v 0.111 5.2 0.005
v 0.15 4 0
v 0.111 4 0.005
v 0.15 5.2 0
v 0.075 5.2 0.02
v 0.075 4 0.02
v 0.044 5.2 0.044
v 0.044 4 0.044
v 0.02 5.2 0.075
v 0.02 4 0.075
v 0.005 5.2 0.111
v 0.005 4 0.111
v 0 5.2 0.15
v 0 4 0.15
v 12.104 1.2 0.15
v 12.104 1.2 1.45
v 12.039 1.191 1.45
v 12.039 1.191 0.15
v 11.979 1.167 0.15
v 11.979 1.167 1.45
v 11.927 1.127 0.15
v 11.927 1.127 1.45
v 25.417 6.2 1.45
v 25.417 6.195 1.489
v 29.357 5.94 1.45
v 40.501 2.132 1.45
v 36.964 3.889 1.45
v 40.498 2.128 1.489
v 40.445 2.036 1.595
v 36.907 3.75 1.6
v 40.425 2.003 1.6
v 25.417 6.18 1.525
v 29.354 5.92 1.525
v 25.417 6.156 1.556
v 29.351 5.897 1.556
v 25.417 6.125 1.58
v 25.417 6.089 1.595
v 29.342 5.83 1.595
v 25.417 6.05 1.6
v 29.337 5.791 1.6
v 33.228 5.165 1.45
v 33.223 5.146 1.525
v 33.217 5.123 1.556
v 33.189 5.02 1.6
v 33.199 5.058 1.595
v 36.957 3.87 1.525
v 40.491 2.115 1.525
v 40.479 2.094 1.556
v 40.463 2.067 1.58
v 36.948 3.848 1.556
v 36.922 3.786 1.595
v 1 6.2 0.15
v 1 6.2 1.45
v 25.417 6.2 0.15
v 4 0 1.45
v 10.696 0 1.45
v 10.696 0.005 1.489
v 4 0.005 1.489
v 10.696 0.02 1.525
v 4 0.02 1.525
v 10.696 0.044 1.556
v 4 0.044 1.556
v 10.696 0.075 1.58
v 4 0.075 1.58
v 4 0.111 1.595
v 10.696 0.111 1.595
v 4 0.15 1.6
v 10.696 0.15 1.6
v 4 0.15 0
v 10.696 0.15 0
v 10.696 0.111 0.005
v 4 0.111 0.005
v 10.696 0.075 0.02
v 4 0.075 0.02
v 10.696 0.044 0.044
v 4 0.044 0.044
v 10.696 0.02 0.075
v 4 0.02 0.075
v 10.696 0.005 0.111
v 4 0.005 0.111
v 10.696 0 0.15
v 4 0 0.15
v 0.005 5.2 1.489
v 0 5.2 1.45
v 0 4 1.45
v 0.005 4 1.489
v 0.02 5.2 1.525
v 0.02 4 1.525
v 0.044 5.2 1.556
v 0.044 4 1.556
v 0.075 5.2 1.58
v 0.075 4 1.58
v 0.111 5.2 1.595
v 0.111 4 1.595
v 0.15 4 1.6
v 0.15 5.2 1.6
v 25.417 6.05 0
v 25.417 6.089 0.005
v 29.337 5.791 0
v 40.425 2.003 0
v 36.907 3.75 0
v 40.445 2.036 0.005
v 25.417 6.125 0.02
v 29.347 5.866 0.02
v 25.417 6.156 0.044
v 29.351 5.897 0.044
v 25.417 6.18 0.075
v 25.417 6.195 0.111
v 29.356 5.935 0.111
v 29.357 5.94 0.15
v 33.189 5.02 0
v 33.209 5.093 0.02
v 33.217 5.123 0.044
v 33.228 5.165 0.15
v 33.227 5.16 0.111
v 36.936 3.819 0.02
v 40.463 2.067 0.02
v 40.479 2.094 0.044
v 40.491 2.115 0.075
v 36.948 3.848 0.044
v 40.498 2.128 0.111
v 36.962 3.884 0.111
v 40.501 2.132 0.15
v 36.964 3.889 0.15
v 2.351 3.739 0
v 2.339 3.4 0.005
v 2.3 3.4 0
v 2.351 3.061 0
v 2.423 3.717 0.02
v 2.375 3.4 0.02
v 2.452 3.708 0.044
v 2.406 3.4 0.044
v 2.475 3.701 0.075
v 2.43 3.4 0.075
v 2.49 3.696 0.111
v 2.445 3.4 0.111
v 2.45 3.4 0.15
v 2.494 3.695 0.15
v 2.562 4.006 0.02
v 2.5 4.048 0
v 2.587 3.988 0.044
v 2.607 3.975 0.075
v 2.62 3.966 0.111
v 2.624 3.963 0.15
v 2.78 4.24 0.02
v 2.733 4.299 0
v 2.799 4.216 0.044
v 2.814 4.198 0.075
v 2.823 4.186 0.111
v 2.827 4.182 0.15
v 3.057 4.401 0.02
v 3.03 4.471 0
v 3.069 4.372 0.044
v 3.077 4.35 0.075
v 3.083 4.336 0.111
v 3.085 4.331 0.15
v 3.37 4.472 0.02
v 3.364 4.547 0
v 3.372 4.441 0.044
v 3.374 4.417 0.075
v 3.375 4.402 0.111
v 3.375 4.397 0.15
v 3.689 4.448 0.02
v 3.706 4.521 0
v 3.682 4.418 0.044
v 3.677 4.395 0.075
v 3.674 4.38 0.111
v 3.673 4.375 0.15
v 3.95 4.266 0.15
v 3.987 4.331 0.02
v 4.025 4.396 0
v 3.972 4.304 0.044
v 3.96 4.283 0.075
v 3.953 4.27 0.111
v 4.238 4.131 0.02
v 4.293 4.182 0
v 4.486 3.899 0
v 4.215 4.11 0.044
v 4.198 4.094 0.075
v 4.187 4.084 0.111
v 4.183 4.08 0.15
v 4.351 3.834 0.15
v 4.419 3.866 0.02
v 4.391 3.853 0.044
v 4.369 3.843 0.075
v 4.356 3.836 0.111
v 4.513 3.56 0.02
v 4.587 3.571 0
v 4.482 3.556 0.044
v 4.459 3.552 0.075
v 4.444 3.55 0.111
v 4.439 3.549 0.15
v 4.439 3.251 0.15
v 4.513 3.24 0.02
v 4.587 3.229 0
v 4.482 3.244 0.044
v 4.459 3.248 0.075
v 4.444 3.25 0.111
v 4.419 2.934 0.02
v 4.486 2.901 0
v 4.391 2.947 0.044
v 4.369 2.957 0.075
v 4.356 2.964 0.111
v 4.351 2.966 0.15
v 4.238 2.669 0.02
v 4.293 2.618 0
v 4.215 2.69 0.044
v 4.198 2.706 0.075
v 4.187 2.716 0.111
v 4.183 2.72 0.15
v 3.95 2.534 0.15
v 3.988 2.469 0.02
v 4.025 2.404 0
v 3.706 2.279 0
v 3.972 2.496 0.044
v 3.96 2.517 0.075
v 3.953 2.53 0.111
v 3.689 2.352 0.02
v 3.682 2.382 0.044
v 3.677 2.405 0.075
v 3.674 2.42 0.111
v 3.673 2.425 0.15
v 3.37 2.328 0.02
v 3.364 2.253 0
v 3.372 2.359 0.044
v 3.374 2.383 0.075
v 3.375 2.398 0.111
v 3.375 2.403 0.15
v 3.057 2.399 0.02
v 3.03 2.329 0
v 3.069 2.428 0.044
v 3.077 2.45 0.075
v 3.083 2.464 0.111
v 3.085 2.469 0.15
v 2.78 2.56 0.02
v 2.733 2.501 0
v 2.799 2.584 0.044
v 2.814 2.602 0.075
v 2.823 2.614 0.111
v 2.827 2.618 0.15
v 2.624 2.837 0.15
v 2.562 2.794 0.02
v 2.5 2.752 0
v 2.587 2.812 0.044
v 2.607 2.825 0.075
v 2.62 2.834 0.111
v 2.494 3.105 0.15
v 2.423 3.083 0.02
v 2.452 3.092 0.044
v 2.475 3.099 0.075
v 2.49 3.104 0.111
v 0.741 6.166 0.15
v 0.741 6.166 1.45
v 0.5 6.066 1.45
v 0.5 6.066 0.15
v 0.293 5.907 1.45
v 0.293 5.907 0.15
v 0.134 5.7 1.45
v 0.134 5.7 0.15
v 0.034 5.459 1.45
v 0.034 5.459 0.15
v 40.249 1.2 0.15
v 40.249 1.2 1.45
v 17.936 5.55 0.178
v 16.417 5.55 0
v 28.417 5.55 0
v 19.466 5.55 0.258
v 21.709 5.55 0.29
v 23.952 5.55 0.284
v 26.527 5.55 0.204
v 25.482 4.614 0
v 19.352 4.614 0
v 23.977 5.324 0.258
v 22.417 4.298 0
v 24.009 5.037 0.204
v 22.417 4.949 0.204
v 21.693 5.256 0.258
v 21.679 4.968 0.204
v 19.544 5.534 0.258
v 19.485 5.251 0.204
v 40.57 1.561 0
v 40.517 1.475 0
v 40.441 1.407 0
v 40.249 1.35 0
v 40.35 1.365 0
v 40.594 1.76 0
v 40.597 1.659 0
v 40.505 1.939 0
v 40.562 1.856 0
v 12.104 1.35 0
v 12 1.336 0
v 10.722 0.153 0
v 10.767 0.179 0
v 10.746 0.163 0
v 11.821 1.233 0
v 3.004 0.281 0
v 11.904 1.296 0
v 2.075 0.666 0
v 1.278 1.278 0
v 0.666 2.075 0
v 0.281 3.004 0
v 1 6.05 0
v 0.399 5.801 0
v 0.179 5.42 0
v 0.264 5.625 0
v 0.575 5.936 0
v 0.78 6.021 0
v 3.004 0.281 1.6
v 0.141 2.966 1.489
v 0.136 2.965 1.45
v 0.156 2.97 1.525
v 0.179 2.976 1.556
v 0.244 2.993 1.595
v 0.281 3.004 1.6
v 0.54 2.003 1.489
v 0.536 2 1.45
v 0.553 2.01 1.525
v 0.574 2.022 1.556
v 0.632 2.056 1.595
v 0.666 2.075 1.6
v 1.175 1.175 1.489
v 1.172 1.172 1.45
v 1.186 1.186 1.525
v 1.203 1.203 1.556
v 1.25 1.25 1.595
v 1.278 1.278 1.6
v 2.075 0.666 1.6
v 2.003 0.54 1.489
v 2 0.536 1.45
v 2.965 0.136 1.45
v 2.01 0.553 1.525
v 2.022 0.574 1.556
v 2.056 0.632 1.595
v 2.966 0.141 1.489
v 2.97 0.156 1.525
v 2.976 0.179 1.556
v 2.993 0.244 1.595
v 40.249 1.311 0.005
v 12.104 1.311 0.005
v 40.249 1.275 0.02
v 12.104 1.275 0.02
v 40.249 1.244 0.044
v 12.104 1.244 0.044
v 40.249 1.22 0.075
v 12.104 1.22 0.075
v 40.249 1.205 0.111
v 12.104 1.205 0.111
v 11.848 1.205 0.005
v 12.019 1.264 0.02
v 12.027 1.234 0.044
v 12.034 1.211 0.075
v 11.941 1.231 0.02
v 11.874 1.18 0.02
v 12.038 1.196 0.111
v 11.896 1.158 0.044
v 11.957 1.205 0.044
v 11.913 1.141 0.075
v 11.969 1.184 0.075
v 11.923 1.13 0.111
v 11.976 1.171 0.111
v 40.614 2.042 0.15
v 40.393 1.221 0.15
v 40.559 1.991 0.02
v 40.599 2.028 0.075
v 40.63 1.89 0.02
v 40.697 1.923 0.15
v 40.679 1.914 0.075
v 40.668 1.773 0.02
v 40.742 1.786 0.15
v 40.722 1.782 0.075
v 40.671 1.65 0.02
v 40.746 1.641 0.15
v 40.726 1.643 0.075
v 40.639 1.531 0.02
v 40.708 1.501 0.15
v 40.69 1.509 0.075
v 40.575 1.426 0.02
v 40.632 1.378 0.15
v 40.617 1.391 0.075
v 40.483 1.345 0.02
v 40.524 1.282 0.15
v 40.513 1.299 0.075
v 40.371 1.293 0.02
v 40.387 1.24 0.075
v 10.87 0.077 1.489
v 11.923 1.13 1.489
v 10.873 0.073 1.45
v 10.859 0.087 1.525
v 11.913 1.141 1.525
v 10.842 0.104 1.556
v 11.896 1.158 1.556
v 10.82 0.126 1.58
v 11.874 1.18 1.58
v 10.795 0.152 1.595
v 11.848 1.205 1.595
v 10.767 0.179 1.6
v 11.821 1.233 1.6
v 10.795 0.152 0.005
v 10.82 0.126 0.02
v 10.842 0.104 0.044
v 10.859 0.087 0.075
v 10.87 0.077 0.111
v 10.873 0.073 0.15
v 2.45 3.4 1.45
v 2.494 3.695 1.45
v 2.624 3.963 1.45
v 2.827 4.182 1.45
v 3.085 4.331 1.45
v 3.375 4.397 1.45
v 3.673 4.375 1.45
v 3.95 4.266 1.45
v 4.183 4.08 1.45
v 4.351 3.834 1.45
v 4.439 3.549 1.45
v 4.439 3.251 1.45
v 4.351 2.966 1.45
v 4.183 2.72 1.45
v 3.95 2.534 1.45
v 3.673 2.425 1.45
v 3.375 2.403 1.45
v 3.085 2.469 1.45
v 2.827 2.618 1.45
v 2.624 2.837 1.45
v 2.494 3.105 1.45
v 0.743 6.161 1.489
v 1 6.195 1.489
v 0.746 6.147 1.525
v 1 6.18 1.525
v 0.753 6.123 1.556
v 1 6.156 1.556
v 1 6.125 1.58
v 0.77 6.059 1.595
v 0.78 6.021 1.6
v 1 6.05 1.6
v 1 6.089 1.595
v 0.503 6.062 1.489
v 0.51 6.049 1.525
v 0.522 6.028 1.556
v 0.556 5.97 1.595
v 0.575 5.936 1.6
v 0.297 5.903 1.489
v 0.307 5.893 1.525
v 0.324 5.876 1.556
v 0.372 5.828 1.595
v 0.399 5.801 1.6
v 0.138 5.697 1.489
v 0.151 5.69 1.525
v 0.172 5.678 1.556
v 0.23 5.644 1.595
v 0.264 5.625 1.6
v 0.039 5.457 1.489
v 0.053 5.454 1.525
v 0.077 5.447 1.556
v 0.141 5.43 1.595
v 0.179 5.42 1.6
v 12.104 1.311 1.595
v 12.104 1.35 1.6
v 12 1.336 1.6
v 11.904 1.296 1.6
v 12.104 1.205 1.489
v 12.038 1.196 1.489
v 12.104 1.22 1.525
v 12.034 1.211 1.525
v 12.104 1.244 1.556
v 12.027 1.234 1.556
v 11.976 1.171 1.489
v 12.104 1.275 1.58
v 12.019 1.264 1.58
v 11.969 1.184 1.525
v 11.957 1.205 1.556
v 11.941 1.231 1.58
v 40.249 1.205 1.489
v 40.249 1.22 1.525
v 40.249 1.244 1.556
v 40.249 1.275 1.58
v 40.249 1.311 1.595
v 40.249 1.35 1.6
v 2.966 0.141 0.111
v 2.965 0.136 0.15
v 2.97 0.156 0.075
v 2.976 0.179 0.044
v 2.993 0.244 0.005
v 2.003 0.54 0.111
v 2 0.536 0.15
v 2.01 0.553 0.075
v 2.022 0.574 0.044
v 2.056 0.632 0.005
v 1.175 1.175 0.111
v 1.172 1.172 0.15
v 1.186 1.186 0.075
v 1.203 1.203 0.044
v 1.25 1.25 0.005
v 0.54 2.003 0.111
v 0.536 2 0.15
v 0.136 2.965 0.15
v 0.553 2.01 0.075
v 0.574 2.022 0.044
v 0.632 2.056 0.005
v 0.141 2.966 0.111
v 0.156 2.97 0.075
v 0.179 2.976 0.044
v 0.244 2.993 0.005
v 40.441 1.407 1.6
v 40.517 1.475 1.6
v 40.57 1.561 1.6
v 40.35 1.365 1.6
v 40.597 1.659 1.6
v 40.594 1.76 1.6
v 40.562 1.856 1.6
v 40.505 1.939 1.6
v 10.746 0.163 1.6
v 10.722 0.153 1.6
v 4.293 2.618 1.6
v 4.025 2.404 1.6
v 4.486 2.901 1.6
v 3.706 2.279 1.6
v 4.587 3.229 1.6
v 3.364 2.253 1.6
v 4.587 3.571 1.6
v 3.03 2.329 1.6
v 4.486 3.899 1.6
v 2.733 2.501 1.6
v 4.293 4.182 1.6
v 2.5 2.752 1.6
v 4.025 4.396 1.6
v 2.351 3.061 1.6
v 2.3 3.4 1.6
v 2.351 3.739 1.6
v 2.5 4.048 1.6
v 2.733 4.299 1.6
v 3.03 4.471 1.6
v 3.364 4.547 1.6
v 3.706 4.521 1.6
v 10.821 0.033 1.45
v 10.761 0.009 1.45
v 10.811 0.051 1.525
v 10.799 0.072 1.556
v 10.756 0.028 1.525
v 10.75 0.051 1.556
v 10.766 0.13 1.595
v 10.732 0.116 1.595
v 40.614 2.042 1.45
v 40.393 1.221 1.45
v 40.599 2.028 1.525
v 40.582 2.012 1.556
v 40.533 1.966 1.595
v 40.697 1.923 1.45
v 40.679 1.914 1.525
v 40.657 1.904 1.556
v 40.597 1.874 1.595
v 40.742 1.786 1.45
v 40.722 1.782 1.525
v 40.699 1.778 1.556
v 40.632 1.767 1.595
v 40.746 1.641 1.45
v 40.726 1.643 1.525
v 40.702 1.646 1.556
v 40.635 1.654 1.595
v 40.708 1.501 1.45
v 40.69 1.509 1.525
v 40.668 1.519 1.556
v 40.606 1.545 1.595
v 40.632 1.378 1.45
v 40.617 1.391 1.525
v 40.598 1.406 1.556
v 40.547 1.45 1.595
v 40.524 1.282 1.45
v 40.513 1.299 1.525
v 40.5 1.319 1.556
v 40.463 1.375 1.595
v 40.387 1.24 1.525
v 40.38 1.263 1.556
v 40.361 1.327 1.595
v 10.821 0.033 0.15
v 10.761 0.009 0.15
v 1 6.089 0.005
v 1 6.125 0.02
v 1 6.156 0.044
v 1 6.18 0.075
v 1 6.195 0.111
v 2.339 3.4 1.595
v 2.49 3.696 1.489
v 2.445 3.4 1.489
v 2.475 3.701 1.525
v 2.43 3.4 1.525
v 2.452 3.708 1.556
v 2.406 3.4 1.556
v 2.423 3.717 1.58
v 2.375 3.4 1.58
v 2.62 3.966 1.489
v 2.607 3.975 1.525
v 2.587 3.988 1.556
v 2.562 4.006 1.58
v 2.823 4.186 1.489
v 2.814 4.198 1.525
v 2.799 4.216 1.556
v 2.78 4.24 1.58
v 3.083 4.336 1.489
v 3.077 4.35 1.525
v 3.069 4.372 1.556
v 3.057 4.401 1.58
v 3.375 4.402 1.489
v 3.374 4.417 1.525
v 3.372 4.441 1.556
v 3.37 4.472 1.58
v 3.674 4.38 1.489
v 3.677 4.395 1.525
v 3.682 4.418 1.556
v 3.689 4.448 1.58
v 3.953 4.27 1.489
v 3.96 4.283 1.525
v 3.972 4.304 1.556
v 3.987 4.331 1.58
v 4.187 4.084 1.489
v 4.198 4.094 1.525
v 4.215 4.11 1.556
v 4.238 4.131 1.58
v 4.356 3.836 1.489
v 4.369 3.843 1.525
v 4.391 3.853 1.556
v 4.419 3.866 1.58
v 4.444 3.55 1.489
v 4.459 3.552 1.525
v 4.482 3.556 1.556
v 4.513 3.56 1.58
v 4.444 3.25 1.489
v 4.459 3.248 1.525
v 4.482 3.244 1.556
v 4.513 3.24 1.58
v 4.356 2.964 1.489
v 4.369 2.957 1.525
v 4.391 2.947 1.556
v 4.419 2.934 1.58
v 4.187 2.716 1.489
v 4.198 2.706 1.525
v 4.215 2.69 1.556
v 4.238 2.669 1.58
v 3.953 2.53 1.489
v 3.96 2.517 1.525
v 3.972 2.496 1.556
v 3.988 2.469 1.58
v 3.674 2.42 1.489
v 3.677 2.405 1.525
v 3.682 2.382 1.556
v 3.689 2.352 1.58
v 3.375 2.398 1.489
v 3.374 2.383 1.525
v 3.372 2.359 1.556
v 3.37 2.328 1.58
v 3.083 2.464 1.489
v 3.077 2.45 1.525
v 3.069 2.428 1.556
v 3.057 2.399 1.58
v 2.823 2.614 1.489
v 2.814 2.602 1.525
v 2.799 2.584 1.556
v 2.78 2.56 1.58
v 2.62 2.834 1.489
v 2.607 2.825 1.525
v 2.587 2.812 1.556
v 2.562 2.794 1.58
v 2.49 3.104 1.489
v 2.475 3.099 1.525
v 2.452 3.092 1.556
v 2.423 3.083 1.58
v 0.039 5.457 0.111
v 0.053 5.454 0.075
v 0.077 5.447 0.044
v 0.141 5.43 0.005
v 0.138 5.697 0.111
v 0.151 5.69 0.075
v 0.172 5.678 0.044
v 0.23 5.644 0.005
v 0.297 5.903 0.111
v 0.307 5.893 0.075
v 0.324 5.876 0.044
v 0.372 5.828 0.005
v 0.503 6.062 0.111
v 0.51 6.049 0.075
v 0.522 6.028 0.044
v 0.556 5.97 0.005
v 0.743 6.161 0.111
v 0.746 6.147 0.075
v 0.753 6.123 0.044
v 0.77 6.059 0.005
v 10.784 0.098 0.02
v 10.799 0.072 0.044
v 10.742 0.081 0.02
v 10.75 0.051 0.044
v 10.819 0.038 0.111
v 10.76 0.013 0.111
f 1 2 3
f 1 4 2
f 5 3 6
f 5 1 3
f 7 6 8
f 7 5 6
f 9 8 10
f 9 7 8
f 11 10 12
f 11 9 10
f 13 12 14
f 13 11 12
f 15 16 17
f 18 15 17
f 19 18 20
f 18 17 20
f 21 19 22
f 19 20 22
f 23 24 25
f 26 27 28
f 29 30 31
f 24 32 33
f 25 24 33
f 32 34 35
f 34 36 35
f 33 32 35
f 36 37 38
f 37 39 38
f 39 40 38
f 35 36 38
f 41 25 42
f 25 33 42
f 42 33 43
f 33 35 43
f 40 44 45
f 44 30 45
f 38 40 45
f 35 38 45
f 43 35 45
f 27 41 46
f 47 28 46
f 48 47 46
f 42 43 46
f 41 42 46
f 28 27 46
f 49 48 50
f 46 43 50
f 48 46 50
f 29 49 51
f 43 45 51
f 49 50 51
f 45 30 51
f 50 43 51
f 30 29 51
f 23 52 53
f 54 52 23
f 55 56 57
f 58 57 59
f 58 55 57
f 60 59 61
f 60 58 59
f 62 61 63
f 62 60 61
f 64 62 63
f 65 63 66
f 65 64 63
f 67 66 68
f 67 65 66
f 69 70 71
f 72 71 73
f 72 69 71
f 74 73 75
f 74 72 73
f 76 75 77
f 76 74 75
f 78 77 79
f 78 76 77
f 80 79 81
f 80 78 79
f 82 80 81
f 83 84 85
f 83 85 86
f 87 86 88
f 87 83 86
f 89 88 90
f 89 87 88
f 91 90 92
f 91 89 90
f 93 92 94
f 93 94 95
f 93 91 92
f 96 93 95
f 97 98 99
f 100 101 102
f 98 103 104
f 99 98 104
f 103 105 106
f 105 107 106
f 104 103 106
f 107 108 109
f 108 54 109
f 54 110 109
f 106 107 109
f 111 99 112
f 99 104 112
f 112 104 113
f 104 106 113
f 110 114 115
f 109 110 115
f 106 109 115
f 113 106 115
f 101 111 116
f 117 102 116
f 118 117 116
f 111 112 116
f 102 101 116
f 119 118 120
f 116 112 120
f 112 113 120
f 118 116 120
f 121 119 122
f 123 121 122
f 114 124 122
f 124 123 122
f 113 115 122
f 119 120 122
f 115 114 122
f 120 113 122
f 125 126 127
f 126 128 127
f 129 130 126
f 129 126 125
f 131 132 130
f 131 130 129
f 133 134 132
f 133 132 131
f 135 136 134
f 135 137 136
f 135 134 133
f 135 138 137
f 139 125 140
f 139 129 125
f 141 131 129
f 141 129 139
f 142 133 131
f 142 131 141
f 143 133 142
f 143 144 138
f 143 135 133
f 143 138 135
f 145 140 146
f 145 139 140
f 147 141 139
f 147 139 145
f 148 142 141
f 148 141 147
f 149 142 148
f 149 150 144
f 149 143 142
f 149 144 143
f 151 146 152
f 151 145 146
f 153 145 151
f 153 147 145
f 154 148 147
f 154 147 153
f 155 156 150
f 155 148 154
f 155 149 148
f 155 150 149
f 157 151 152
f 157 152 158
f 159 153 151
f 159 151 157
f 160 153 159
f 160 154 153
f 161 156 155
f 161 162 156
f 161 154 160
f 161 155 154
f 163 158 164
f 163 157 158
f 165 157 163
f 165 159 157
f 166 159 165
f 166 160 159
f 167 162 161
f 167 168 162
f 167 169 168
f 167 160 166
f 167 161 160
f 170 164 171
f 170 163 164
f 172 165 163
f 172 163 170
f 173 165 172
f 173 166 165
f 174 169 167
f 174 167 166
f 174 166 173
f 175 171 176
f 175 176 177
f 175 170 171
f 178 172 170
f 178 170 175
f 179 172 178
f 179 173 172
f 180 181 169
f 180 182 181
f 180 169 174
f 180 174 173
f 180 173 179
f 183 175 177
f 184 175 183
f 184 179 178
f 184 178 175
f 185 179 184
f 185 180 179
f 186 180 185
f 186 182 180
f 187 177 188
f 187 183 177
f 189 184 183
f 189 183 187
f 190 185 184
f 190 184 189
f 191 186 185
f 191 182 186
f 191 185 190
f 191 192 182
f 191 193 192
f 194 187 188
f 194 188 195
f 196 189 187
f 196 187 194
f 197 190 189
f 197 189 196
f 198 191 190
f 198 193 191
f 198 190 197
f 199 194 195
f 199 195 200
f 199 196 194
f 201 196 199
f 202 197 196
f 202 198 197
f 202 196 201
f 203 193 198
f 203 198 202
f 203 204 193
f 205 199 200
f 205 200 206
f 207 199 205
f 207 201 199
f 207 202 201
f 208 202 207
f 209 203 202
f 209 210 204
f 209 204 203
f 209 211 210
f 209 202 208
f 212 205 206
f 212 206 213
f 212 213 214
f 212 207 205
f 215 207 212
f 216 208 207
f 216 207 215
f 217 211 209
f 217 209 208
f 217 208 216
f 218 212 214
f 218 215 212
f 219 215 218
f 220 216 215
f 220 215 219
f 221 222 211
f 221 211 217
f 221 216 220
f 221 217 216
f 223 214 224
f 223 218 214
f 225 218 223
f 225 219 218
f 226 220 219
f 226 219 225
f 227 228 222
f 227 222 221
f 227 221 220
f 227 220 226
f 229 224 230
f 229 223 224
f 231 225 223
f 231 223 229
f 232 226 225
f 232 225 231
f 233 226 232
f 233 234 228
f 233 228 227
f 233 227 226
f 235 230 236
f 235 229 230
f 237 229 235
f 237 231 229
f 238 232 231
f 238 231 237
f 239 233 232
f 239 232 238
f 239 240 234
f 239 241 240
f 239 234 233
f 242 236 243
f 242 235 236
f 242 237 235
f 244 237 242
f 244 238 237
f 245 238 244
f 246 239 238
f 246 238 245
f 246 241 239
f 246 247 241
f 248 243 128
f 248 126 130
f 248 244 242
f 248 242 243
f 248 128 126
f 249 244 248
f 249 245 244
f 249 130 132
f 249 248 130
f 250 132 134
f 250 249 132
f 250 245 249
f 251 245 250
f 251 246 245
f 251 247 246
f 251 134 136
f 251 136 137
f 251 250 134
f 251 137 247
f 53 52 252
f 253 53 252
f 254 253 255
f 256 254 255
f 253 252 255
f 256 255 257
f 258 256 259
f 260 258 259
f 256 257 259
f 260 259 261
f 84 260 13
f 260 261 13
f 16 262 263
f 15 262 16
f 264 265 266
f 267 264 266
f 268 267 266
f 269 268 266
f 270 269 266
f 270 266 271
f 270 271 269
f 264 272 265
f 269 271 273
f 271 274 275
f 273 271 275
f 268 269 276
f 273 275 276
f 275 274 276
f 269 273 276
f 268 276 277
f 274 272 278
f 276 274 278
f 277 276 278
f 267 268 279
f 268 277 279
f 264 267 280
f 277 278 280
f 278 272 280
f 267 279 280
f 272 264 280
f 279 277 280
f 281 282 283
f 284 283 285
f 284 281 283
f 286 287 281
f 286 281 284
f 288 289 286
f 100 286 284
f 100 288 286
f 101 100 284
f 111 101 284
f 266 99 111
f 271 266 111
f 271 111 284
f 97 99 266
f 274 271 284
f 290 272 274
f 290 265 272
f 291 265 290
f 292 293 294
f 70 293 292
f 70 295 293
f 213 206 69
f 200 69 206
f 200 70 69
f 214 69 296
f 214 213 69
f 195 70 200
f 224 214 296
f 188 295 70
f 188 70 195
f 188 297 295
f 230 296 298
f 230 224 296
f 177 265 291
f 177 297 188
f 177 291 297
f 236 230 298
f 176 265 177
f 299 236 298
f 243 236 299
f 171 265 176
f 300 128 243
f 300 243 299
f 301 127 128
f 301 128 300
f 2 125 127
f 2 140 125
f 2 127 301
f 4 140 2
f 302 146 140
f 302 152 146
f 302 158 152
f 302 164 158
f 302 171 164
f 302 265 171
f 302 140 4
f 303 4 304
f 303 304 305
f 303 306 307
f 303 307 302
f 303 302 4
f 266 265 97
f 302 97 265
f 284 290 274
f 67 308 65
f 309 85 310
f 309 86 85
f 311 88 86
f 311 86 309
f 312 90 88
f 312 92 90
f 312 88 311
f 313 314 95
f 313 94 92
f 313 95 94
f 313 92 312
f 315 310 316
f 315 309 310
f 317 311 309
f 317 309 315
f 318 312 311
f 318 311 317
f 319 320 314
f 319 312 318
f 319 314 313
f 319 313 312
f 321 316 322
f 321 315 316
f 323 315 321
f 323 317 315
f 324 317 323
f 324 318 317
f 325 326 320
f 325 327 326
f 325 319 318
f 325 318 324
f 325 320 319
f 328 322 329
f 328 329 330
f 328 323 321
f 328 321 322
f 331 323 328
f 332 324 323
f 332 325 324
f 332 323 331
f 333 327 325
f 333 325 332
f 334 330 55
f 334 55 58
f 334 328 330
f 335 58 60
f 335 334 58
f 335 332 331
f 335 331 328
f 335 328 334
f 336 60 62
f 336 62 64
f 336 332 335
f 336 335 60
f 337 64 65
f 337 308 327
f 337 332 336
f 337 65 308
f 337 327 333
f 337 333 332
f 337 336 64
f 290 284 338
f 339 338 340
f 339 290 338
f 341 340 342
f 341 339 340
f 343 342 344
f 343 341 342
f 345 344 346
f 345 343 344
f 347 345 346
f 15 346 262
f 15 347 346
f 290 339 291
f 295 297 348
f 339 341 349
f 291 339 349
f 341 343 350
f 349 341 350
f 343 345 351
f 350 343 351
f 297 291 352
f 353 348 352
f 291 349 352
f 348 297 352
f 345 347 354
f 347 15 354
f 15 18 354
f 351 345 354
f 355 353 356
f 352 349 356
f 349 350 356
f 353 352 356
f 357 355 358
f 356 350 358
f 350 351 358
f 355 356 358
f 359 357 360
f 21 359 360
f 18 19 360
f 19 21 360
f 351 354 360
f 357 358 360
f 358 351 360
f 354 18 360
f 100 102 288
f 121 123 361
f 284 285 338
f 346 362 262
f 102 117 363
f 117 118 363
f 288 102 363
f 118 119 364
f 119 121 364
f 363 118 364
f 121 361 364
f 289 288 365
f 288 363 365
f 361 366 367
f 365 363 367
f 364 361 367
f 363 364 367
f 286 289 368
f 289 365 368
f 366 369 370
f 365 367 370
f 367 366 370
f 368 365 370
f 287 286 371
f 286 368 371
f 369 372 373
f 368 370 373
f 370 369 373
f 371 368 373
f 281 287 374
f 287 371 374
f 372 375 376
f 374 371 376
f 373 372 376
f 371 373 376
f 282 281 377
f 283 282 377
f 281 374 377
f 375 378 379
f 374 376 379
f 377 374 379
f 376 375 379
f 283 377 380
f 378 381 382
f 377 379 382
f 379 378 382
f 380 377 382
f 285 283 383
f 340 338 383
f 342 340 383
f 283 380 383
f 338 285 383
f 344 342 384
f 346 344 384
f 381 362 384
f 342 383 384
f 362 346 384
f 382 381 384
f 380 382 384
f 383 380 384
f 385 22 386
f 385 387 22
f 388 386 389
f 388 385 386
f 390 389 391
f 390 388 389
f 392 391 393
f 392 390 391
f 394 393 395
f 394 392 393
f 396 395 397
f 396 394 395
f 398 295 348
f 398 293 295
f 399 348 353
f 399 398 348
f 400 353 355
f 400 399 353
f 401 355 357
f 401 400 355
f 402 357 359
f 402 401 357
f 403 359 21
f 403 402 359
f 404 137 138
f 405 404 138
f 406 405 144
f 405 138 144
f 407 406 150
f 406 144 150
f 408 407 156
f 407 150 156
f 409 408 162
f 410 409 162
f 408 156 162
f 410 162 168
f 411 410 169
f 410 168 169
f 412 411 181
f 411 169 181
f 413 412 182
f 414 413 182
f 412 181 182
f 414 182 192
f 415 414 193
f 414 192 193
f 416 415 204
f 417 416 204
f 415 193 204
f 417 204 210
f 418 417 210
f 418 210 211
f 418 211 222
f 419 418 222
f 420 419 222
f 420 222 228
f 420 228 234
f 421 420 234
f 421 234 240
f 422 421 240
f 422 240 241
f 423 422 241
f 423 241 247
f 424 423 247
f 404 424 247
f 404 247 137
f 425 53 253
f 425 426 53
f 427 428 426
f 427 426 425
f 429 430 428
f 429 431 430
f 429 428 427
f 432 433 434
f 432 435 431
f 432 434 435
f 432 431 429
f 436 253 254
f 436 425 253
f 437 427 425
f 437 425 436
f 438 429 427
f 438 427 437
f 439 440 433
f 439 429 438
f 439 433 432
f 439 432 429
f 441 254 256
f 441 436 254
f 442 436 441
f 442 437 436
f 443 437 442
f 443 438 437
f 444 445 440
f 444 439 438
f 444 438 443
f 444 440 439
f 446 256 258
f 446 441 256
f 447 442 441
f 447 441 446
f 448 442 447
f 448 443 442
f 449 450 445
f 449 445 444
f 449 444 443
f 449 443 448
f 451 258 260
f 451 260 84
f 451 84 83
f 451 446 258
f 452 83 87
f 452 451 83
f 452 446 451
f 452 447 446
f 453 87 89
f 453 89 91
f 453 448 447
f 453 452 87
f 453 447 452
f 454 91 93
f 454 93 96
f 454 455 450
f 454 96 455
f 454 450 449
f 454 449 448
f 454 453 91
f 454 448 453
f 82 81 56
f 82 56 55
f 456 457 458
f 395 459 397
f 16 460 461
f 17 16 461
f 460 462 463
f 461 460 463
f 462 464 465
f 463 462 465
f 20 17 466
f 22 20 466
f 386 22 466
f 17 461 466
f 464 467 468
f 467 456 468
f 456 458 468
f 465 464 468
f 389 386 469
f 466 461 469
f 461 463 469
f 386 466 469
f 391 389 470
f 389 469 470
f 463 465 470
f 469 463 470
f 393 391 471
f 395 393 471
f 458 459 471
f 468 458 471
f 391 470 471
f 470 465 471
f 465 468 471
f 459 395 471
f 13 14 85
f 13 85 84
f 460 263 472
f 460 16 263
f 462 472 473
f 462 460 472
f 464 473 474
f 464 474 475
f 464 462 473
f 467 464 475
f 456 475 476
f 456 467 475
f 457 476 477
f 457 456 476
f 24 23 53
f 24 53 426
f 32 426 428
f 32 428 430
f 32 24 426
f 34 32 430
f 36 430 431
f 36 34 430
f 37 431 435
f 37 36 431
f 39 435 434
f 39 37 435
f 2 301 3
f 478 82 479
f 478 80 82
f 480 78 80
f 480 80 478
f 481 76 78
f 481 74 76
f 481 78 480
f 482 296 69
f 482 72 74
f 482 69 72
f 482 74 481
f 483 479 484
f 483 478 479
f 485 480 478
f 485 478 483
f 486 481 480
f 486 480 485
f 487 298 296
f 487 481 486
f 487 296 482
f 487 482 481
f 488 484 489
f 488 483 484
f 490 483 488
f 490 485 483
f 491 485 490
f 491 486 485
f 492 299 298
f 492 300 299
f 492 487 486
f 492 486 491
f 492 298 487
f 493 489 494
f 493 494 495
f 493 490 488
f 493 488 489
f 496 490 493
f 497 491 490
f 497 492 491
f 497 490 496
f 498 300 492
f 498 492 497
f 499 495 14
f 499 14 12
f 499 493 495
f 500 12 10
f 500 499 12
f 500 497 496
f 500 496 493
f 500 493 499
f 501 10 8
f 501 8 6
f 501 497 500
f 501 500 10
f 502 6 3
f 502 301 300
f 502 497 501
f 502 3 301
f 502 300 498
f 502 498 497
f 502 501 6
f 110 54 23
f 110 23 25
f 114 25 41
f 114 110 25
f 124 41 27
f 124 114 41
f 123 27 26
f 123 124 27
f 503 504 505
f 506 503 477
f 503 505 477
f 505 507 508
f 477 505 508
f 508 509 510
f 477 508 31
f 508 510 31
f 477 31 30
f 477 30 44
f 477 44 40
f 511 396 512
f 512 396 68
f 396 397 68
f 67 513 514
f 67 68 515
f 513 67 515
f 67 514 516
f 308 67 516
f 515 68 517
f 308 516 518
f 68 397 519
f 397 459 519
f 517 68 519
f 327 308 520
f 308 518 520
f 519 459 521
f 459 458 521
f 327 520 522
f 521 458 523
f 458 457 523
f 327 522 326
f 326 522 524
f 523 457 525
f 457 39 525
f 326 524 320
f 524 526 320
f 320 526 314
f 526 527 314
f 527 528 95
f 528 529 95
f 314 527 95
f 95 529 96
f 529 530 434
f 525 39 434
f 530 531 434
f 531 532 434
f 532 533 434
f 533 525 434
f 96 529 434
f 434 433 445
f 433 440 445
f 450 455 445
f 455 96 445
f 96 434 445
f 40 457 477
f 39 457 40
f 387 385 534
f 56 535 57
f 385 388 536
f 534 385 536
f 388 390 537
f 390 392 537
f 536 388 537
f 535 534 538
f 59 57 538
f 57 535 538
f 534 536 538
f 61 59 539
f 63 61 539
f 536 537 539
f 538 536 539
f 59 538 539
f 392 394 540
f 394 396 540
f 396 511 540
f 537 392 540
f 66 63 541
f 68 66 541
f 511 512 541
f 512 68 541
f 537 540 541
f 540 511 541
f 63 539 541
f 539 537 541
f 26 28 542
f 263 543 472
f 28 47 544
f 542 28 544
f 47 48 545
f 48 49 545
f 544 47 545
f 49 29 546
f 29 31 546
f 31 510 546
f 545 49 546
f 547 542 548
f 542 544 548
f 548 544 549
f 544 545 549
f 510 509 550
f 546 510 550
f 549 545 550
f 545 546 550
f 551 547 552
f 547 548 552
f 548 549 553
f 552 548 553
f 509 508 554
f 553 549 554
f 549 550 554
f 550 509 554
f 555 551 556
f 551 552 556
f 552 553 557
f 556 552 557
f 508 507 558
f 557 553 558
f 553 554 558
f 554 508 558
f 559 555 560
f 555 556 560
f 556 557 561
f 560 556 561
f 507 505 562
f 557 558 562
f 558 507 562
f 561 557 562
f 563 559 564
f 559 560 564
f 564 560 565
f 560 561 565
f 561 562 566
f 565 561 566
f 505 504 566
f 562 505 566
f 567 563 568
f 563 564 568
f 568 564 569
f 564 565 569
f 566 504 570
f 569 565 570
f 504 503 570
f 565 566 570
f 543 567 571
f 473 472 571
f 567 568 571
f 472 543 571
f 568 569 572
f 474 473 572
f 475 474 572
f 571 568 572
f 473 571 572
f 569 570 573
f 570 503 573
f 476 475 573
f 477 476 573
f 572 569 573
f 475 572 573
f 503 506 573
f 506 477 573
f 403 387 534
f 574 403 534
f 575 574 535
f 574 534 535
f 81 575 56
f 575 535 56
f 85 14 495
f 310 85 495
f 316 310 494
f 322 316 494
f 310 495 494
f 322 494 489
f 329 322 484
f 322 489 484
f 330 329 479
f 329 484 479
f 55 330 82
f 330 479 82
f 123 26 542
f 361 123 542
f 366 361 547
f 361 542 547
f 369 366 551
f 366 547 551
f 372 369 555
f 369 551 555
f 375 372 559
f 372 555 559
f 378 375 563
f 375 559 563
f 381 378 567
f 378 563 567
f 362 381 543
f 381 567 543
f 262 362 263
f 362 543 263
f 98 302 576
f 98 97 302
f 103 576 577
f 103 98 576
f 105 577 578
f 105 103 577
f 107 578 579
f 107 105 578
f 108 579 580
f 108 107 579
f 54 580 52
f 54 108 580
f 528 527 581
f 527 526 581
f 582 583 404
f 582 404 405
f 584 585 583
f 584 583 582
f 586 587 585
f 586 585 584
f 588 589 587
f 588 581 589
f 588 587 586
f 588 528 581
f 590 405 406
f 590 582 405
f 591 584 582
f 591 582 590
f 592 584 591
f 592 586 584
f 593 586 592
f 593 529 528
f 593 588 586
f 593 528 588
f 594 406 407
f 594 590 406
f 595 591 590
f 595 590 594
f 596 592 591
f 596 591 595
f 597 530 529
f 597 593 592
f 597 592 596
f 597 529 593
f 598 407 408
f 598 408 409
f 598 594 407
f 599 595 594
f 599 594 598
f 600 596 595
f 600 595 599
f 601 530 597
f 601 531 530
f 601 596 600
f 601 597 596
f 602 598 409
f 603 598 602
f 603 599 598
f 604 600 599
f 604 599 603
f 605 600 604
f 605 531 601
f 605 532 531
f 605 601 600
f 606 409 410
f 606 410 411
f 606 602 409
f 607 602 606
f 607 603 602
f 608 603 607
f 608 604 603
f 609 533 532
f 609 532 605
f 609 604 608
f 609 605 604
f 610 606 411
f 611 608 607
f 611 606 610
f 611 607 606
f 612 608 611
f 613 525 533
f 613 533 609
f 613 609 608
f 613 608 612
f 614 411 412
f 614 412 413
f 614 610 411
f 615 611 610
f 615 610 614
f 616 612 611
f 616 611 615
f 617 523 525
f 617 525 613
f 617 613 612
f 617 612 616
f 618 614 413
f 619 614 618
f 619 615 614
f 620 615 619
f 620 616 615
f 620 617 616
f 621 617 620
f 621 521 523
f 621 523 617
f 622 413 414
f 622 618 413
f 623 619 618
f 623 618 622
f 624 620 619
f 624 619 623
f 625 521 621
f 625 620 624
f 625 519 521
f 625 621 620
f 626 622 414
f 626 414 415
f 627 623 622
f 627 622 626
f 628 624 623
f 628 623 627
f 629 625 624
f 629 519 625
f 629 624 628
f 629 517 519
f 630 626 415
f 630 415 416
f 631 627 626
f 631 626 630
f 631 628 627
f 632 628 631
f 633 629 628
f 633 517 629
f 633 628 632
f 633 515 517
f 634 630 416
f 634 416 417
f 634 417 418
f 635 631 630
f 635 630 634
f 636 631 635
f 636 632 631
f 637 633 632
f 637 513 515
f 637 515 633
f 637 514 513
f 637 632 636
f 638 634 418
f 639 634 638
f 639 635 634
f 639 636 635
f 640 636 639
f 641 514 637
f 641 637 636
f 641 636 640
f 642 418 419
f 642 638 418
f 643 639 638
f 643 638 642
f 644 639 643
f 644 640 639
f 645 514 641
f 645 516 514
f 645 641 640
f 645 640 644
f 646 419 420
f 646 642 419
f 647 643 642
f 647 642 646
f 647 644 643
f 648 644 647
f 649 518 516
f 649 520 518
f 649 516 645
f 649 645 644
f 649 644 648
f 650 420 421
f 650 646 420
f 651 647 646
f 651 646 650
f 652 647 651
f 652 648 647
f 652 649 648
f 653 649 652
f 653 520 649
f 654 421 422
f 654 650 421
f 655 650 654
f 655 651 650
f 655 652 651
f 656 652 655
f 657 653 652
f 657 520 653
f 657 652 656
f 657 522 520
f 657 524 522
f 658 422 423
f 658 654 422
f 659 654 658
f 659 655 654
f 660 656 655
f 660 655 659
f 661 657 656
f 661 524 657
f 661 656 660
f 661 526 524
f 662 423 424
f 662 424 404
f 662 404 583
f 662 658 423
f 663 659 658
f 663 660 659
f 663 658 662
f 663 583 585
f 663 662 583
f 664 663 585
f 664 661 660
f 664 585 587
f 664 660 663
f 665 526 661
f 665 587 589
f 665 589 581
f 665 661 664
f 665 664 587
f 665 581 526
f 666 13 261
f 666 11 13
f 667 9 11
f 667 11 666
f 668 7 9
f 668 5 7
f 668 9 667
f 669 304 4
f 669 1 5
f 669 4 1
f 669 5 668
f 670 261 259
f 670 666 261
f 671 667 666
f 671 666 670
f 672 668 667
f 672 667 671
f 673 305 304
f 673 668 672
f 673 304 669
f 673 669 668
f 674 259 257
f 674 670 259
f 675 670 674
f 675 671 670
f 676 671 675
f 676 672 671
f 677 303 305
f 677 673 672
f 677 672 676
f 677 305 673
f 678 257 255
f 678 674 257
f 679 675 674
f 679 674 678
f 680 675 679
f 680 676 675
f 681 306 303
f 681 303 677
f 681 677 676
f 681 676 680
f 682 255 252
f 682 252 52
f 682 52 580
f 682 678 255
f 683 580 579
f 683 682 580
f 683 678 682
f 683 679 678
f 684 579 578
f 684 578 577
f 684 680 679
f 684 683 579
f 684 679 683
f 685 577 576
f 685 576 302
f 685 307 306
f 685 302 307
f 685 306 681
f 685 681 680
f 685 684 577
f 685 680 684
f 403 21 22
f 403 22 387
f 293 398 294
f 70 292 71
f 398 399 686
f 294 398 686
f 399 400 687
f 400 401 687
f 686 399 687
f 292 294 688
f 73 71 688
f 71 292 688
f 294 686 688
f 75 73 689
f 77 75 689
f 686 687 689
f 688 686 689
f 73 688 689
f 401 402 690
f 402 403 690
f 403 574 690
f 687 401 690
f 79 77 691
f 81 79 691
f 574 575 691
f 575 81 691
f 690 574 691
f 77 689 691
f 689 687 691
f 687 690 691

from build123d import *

# Parameters (mm, degrees)
BOSS_EXTRUDE1_DEPTH = 1.6
FILLET1_R           = 0.5
FILLET2_R           = 0.25
FILLET3_R           = 0.15
CUT_EXTRUDE1_DEPTH  = 0.3
FILLET4_R           = 4
SKETCH3_R           = 1
CUT_EXTRUDE2_DEPTH  = 42.249281937
FILLET5_R           = 4
FILLET6_R           = 1
FILLET7_R           = 0.15


with BuildPart() as part:
    # Sketch1 → Boss-Extrude1 (new body)
    with BuildSketch(Plane.XY):
        with BuildLine():
            Line((0, 0), (0, 6.2))
            Line((0, 6.2), (25.416876048, 6.2))
            ThreePointArc((25.416876048, 6.2), (34.077130086, 4.922813233), (42, 1.2))
            Line((42, 1.2), (12, 1.2))
            Line((12, 1.2), (10.8, 0))
            Line((10.8, 0), (0, 0))
        make_face()
    extrude(amount=BOSS_EXTRUDE1_DEPTH)

    # Fillet1
    fillet1_edges = [part.edges().sort_by_distance(p)[0] for p in [
        (42, 1.2, 0.8),
    ]]
    fillet(fillet1_edges, radius=FILLET1_R)

    # Fillet2
    fillet2_edges = [part.edges().sort_by_distance(p)[0] for p in [
        (12, 1.2, 0.8),
        (10.8, 0, 0.8),
    ]]
    fillet(fillet2_edges, radius=FILLET2_R)

    # Fillet3
    fillet3_edges = [part.edges().sort_by_distance(p)[0] for p in [
        (12.708438024, 6.2, 1.6),
        (33.228210707, 5.16520414, 0),
        (33.228210707, 5.16520414, 1.6),
        (0, 3.1, 1.6),
        (40.732026425, 1.569811089, 0),
        (40.732026425, 1.569811089, 1.6),
        (11.4, 0.6, 0),
        (11.4, 0.6, 1.6),
        (26.176413207, 1.2, 0),
        (10.792117467, 0.019030117, 0),
        (26.176413207, 1.2, 1.6),
        (10.792117467, 0.019030117, 1.6),
        (12.007882533, 1.180969883, 0),
        (12.007882533, 1.180969883, 1.6),
        (5.348223305, 0, 1.6),
        (0, 3.1, 0),
        (12.708438024, 6.2, 0),
        (5.348223305, 0, 0),
    ]]
    fillet(fillet3_edges, radius=FILLET3_R)

    # Sketch2 → Cut-Extrude1 (cut)
    with BuildSketch(Plane(origin=(0, 0, 0), x_dir=(-1, 0, 0), z_dir=(0, 0, -1))):
        with BuildLine():
            Line((-16.416876048, 5.55), (-28.416876048, 5.55))
            ThreePointArc((-28.416876048, 5.55), (-22.416876048, 4.297727085), (-16.416876048, 5.55))
        make_face()
    extrude(amount=-CUT_EXTRUDE1_DEPTH, mode=Mode.SUBTRACT)

    # Fillet4
    # the kernel refuses this fillet: 4 mm, written as the material it adds along each edge
    with BuildSketch(Plane(origin=(22.416876048, 19.297727085, 0.3), x_dir=(0.6169459509621767, -0.7870055232279983, 0), z_dir=(0.7870055232279983, 0.6169459509621767, 0))) as fillet4_piece_1_section:
        with BuildLine():
            CenterArc((13.480131585, 4), FILLET4_R, 270, 22.331645009)
            Line((13.480131585, 0), (13.480131585, -0.08))
            Line((13.480131585, -0.08), (15, -0.08))
            Line((15, -0.08), (15.08, 0))
            ThreePointArc((15.08, 0), (15.08, 0.15), (15.030397368, 0.226))
            Line((15.030397368, 0.226), (15, 0.3))
        make_face()
    fillet4_piece_1 = revolve(axis=Axis((22.416876048, 19.297727085, 0.3), (0, 0, -1)), revolution_arc=76.186906047, mode=Mode.PRIVATE)
    fillet4_piece_1 = split(fillet4_piece_1, bisect_by=Plane(origin=(22.416876137, 5.55, 0.246369344), z_dir=(0, -1, 0)), keep=Keep.TOP, mode=Mode.PRIVATE)
    add(fillet4_piece_1)

    # Sketch3 → Cut-Extrude2 (cut, through all)
    with BuildSketch(Plane(origin=(0, 0, 0), x_dir=(-1, 0, 0), z_dir=(0, 0, -1))):
        with Locations((-3.45, 3.4)):
            Circle(SKETCH3_R)
    extrude(amount=-CUT_EXTRUDE2_DEPTH, mode=Mode.SUBTRACT)

    # Fillet5
    # the kernel refuses this fillet: 4 mm, written as the material it takes off along each edge
    with BuildSketch(Plane(origin=(4, 4, 0), x_dir=(0, -1, 0), z_dir=(1, 0, 0))) as fillet5_piece_1:
        with BuildLine():
            CenterArc((3.85, -0.15), 0.15, 0, 90)
            Line((4, -0.15), (4, 0))
            Line((4, 0), (3.85, 0))
        make_face()
    revolve(axis=Axis((4, 4, 0), (0, 0, -1)), revolution_arc=90, mode=Mode.SUBTRACT)
    with BuildSketch(Plane(origin=(4, 4, 1.6), x_dir=(-1, 0, 0), z_dir=(0, 1, 0))) as fillet5_piece_2:
        with BuildLine():
            CenterArc((3.85, -0.15), 0.15, 0, 90)
            Line((4, -0.15), (4, 0))
            Line((4, 0), (3.85, 0))
        make_face()
    revolve(axis=Axis((4, 4, 1.6), (0, 0, 1)), revolution_arc=90, mode=Mode.SUBTRACT)
    with BuildSketch(Plane(origin=(0, 0, 0), x_dir=(0, 1, 0), z_dir=(0, 0, 1))) as fillet5_piece_3:
        with BuildLine():
            CenterArc((FILLET5_R, -FILLET5_R), FILLET5_R, 90, 90)
            Line((0, -FILLET5_R), (0, 0))
            Line((0, 0), (FILLET5_R, 0))
        make_face()
    extrude(amount=1.6, mode=Mode.SUBTRACT)

    # Fillet6
    # the kernel refuses this fillet: 1 mm, written as the material it takes off along each edge
    with BuildSketch(Plane(origin=(1, 5.2, 0), x_dir=(-1, 0, 0), z_dir=(0, -1, 0))) as fillet6_piece_1:
        with BuildLine():
            CenterArc((0.85, -0.15), 0.15, 0, 90)
            Line((1, -0.15), (1, 0))
            Line((1, 0), (0.85, 0))
        make_face()
    revolve(axis=Axis((1, 5.2, 0), (0, 0, -1)), revolution_arc=90, mode=Mode.SUBTRACT)
    with BuildSketch(Plane(origin=(1, 5.2, 1.6), x_dir=(0, 1, 0), z_dir=(1, 0, 0))) as fillet6_piece_2:
        with BuildLine():
            CenterArc((0.85, -0.15), 0.15, 0, 90)
            Line((1, -0.15), (1, 0))
            Line((1, 0), (0.85, 0))
        make_face()
    revolve(axis=Axis((1, 5.2, 1.6), (0, 0, 1)), revolution_arc=90, mode=Mode.SUBTRACT)
    with BuildSketch(Plane(origin=(0, 6.2, 0), x_dir=(0, -1, 0), z_dir=(0, 0, 1))) as fillet6_piece_3:
        with BuildLine():
            CenterArc((FILLET6_R, FILLET6_R), FILLET6_R, 180, 90)
            Line((0, FILLET6_R), (0, 0))
            Line((0, 0), (FILLET6_R, 0))
        make_face()
    extrude(amount=1.6, mode=Mode.SUBTRACT)

    # Fillet7
    fillet7_edges = [part.edges().sort_by_distance(p)[0] for p in [
        (4.45, 3.4, 1.6),
        (4.45, 3.4, 0),
    ]]
    fillet(fillet7_edges, radius=FILLET7_R)


solid = part.part
